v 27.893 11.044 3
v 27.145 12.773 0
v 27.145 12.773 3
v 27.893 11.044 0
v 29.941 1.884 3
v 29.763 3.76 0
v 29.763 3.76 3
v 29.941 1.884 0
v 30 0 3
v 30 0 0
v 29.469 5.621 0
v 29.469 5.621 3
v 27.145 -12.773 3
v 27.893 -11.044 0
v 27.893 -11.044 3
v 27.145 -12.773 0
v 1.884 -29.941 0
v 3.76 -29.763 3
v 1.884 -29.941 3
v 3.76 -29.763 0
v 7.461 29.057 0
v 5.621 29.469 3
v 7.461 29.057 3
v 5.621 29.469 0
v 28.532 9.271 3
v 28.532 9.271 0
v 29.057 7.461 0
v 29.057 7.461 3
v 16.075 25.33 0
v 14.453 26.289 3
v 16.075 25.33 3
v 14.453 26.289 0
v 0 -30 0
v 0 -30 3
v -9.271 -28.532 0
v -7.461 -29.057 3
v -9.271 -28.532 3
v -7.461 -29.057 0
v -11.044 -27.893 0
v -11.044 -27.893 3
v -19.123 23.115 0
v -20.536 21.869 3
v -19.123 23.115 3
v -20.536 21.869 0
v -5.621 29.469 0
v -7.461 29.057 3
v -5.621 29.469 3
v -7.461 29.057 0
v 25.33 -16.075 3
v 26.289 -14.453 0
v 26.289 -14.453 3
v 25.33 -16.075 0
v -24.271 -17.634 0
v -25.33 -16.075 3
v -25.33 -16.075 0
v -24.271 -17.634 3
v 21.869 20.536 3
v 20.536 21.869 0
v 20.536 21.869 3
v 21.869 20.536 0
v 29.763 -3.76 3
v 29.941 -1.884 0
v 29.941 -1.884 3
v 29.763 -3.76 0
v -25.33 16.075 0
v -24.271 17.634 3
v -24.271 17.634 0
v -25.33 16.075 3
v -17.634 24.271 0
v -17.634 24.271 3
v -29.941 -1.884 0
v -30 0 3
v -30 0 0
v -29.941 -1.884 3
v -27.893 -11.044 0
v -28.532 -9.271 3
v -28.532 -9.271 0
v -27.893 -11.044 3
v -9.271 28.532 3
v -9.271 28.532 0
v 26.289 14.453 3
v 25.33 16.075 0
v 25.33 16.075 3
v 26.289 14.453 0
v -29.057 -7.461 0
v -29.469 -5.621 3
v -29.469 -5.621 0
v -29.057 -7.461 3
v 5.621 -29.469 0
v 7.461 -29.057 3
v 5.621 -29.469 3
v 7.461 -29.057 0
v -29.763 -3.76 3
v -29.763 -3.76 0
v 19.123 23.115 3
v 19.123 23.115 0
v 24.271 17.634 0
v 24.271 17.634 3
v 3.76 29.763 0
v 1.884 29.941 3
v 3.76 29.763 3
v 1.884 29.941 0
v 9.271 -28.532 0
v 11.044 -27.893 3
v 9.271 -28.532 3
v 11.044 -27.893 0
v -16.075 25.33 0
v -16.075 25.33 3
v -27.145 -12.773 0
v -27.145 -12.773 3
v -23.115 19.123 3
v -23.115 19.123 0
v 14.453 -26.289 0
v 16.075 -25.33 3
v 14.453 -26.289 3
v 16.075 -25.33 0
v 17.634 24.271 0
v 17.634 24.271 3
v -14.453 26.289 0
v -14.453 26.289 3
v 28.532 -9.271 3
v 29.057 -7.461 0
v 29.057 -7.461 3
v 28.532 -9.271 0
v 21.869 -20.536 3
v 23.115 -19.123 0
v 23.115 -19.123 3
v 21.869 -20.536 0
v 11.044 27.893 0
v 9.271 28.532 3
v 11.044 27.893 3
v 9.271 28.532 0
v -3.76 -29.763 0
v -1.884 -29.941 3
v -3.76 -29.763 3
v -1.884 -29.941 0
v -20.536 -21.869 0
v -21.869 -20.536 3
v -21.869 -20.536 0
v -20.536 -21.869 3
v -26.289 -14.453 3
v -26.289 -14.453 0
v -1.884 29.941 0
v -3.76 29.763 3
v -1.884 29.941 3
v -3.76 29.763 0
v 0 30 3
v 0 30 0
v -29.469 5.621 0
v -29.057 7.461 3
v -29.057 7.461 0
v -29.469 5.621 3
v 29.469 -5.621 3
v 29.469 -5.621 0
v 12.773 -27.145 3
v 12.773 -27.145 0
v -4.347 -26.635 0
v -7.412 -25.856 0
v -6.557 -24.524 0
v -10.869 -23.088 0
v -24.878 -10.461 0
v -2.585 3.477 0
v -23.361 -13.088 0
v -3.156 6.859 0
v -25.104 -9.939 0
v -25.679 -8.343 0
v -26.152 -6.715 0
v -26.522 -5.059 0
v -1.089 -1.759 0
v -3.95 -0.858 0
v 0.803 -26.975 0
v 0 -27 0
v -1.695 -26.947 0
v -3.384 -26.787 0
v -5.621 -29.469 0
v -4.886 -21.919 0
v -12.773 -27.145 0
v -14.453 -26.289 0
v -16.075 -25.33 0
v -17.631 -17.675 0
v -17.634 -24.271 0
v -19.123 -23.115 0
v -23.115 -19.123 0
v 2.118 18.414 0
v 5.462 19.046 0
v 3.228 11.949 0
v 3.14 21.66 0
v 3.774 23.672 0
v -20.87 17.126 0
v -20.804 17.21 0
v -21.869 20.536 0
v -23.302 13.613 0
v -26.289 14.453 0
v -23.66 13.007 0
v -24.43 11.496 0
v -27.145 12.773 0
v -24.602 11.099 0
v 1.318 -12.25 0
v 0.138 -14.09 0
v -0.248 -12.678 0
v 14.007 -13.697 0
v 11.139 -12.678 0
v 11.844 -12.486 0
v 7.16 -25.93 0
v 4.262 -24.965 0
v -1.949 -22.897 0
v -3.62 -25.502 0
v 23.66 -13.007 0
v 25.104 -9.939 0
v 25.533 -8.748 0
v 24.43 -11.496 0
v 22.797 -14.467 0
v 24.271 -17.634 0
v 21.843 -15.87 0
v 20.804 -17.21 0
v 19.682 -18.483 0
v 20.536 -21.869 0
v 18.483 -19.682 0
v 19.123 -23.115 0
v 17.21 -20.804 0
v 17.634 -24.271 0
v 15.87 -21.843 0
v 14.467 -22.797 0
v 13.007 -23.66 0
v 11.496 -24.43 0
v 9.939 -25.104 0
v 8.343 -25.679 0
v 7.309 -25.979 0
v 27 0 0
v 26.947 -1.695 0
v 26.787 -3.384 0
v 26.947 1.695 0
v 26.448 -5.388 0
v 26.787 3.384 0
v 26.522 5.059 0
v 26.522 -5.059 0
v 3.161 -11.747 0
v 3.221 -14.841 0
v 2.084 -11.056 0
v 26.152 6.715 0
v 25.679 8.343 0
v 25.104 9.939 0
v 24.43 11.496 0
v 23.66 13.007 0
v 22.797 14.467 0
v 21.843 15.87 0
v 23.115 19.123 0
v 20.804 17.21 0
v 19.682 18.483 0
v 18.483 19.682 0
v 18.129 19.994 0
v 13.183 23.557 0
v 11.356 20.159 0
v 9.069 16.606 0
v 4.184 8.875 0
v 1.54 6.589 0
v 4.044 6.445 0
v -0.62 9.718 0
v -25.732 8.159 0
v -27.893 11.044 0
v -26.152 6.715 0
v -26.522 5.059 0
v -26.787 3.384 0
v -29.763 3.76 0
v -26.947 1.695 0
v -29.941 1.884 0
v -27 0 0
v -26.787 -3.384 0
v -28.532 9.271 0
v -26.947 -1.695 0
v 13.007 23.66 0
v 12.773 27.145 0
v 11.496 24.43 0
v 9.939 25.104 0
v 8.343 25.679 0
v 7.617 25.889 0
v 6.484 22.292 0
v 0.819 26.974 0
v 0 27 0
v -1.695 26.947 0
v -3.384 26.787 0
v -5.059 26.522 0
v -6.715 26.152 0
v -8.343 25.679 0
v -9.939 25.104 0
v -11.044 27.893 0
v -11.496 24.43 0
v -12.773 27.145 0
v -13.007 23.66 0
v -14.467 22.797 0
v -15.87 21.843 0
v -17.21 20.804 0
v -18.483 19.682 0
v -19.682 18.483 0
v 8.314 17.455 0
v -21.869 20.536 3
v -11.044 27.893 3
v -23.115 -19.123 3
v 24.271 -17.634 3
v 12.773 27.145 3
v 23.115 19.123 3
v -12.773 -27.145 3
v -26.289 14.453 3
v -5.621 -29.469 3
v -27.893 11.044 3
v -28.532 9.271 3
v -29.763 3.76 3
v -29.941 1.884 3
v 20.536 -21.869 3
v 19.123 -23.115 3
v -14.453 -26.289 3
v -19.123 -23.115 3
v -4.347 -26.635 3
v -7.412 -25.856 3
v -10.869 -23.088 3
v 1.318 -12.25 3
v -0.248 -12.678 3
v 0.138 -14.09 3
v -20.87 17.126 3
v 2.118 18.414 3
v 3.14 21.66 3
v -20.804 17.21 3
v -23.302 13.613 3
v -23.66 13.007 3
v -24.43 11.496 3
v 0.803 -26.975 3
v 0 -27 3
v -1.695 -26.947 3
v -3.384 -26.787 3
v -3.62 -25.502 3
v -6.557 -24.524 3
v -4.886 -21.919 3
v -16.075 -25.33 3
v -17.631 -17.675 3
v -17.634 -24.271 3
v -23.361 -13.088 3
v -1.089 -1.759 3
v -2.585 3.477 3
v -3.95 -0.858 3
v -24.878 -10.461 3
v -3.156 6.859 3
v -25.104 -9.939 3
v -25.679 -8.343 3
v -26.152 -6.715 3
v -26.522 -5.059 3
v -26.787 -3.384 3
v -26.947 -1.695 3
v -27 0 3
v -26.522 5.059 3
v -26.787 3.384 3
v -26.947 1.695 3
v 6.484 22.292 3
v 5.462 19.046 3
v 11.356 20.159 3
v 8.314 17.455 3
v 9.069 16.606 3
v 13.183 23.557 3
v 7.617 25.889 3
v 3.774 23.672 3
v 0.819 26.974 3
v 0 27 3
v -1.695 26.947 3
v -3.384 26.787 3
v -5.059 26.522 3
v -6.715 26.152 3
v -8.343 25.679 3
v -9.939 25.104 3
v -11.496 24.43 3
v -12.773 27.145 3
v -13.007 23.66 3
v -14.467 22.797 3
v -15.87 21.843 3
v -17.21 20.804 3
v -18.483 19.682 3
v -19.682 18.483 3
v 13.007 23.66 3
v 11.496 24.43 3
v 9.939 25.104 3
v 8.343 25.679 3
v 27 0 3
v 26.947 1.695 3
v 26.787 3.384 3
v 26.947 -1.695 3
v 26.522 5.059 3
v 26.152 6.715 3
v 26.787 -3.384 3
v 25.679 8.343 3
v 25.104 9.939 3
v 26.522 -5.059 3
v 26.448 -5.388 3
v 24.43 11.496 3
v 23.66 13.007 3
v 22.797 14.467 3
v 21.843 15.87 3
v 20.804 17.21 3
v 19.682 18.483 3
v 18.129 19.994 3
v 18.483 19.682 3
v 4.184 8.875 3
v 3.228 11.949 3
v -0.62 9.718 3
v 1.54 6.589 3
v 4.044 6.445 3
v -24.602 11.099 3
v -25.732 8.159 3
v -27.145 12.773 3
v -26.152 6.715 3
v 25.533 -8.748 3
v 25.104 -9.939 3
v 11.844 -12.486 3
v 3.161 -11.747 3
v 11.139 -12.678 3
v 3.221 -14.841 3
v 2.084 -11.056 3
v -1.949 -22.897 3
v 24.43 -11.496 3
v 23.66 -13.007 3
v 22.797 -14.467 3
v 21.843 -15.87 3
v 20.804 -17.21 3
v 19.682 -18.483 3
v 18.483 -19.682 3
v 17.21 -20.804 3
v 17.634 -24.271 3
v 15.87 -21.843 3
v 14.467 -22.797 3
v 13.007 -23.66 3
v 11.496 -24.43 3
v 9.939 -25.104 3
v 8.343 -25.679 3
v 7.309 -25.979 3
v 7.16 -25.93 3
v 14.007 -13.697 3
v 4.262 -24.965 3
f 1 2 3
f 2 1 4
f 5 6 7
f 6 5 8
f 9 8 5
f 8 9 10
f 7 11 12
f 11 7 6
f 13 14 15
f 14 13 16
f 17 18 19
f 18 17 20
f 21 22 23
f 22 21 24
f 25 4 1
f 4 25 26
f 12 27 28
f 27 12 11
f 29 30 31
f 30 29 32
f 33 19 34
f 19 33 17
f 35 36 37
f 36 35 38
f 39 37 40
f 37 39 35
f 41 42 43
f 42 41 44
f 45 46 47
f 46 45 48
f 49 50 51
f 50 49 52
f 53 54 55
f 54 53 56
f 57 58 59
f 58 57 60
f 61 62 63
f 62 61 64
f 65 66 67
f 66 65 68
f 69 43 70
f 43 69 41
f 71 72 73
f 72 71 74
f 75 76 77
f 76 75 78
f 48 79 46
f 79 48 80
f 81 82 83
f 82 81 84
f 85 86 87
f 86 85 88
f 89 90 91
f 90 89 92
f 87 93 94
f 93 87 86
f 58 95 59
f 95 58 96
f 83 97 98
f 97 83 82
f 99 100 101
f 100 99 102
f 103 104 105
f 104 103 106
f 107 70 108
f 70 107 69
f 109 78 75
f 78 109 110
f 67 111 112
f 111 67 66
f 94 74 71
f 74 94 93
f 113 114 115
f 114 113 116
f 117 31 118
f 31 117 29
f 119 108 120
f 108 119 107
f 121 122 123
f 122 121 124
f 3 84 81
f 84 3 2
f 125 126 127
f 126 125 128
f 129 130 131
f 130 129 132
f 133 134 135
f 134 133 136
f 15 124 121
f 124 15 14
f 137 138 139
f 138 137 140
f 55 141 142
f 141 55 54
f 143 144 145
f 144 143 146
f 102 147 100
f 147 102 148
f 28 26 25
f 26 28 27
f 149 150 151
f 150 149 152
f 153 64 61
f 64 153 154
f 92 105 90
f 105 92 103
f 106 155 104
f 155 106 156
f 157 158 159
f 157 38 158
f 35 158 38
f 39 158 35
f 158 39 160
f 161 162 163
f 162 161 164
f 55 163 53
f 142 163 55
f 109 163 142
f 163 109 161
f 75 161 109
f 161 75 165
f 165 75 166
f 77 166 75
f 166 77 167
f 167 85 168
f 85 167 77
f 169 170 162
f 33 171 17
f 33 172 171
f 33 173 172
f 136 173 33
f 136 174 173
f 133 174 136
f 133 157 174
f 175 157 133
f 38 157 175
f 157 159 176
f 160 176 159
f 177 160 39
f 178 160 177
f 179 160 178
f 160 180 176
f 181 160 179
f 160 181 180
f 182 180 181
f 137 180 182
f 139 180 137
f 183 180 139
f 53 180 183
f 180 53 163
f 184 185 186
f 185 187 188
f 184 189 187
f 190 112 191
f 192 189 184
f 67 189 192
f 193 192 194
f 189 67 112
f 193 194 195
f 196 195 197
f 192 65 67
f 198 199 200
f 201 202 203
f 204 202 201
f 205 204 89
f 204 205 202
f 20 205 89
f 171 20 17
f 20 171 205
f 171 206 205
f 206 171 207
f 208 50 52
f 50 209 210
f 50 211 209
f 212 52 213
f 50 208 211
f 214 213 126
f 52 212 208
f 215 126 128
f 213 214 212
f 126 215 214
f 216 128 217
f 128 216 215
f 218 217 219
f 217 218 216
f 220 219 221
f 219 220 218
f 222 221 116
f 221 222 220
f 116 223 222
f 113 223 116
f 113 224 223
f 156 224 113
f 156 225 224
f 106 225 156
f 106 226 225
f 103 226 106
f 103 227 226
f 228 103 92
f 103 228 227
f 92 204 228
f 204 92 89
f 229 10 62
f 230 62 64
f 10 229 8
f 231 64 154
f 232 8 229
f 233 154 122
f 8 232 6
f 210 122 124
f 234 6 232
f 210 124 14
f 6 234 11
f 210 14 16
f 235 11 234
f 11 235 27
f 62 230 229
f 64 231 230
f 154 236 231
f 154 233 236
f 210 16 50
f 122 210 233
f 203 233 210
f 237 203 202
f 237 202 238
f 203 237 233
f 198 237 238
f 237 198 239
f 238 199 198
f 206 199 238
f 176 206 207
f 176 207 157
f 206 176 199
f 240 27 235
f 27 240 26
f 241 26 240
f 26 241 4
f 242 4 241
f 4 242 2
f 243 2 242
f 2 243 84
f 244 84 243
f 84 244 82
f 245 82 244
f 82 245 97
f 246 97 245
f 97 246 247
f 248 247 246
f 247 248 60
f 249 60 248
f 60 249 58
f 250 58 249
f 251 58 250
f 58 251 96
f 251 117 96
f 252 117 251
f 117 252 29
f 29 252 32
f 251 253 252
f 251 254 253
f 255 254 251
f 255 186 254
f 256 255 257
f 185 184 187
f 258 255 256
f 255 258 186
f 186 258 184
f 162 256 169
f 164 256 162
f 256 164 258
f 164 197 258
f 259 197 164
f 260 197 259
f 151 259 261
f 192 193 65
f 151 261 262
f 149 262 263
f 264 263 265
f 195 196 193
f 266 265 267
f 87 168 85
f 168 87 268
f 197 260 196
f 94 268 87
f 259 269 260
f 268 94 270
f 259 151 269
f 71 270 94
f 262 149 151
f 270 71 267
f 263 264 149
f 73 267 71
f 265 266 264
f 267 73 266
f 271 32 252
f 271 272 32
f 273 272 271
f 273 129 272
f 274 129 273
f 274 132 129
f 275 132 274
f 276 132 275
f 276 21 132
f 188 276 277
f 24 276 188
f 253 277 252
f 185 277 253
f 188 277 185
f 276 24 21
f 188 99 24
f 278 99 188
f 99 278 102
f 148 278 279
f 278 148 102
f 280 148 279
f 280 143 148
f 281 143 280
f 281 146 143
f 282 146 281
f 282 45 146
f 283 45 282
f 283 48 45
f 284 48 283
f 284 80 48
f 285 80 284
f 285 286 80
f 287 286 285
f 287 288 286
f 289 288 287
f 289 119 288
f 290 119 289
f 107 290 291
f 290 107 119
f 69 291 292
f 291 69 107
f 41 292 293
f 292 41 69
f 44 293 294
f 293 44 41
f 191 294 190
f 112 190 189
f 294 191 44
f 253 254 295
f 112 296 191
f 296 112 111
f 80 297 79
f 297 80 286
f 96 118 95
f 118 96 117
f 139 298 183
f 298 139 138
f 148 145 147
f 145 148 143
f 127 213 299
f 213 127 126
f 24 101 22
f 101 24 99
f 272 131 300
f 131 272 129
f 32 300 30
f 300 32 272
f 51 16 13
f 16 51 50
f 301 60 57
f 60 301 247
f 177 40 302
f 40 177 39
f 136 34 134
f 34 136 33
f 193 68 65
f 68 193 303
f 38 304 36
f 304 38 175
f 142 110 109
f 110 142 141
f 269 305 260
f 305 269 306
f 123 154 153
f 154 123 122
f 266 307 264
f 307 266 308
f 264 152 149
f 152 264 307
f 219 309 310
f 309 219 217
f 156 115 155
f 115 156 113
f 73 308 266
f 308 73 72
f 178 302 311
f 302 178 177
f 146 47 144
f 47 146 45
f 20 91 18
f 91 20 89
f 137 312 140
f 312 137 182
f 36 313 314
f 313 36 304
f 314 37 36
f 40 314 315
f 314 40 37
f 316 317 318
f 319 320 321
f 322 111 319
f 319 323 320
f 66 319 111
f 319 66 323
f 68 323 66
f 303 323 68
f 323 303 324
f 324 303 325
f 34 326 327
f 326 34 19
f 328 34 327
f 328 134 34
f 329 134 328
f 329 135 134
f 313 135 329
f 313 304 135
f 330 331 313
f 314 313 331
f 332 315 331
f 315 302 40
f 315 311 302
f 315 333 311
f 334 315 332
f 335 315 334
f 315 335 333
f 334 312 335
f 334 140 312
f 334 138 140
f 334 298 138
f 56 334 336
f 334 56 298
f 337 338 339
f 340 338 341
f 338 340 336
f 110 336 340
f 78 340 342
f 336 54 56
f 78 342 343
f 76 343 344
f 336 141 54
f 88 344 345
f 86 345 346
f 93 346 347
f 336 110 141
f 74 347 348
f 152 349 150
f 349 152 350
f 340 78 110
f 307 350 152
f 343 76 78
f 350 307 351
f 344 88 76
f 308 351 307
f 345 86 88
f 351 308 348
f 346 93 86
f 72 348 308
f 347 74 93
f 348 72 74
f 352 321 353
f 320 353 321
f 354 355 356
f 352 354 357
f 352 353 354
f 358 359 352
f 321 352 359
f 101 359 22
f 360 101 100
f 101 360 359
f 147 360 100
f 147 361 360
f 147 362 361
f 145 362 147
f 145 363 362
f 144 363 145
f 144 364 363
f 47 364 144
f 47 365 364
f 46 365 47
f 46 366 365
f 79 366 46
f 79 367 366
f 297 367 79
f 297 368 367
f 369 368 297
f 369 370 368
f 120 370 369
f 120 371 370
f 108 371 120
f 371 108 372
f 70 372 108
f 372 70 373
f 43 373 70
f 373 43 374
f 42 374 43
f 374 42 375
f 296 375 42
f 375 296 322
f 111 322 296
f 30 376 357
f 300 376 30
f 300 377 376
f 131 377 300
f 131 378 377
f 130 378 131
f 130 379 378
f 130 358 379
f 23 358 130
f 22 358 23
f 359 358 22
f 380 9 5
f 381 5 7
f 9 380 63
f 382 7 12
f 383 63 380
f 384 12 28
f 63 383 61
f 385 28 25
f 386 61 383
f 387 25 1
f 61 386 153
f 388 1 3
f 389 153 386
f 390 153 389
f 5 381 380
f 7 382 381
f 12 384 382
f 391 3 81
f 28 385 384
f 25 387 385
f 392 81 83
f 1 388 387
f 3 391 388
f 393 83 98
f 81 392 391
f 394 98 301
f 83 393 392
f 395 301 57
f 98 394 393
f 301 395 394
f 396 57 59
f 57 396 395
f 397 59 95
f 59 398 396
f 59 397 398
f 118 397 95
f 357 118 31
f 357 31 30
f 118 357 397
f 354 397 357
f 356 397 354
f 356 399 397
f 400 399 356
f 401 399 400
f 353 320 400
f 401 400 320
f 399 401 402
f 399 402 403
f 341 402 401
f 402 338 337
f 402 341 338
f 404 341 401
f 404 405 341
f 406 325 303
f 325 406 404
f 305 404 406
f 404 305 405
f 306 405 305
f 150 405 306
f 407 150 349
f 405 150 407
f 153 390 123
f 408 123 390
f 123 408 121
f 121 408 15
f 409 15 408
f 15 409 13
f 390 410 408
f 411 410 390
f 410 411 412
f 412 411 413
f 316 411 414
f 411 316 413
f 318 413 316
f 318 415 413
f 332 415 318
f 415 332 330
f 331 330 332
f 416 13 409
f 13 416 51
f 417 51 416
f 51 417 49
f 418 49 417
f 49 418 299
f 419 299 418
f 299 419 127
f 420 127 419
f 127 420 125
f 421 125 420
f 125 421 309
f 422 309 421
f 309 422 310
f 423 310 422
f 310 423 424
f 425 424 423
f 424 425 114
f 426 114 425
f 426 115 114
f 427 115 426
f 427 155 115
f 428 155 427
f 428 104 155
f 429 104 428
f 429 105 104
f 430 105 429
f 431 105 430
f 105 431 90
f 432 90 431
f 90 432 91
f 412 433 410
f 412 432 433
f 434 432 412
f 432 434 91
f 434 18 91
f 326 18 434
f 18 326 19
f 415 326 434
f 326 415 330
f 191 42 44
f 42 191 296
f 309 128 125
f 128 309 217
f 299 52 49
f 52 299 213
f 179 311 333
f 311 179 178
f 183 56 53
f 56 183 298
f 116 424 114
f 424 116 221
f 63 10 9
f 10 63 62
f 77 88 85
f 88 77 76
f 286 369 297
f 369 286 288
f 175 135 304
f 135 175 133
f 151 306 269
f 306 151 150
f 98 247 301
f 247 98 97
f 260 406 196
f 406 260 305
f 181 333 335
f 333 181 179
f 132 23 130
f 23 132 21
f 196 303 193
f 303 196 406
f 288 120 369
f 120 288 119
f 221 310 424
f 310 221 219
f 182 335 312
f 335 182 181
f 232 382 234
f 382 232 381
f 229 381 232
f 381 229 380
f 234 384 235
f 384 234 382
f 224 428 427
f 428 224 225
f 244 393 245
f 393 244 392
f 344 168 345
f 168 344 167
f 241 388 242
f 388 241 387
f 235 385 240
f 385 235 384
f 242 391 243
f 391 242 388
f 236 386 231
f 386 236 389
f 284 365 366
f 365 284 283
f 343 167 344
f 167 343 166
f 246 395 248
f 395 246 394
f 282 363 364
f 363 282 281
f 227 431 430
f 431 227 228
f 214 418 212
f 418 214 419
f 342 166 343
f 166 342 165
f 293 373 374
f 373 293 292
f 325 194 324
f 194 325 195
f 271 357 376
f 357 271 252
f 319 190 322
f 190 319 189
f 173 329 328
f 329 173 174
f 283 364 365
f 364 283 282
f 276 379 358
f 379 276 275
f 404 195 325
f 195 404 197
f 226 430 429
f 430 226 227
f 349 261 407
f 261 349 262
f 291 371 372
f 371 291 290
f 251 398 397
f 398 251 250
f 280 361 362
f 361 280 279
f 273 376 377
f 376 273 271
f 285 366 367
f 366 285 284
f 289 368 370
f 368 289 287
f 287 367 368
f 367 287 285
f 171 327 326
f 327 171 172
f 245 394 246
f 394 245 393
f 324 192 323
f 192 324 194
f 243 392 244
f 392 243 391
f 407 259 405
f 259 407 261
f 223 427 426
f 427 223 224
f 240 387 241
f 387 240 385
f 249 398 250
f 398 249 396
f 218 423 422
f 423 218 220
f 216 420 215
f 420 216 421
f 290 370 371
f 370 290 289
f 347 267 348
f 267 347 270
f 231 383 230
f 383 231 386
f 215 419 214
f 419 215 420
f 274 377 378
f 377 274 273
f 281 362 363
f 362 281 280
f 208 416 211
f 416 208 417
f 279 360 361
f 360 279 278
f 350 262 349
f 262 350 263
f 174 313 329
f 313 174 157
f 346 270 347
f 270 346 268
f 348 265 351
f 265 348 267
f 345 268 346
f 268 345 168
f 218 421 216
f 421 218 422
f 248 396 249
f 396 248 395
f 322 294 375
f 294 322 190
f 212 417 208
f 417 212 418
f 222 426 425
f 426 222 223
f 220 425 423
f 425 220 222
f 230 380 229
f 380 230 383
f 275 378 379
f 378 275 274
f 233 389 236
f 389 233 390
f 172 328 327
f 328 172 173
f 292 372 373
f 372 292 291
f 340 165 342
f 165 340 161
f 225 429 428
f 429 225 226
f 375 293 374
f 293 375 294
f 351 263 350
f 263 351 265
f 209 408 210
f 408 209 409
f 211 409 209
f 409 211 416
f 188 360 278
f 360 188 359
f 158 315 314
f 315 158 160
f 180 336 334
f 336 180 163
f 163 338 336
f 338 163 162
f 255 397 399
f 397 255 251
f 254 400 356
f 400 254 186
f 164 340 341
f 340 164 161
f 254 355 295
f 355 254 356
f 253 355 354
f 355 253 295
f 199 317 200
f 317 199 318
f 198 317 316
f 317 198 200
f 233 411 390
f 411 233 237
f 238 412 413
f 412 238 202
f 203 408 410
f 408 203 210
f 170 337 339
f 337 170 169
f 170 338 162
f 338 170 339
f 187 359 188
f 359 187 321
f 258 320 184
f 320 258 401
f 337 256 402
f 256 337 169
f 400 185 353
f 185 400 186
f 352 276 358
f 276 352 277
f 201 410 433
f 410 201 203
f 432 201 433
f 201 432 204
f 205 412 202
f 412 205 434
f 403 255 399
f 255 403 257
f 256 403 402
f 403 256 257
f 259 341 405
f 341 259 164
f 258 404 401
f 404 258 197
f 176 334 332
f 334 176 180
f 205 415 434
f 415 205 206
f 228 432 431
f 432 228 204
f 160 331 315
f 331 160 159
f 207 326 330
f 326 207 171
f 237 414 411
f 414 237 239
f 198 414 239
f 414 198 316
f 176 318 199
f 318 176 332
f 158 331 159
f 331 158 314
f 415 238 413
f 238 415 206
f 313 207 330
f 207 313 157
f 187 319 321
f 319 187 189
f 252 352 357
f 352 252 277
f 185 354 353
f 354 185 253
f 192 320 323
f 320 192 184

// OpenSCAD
// file: common.scad
DEFAULT_FN = 100;
DEFAULT_COASTER_RADIUS = 30;
DEFAULT_THICKNESS = 3;
// main file
include <common.scad>;

DEFAULT_NUM_LINES = 30;

module RandoLineCoasterRound(
    numLines = DEFAULT_NUM_LINES,
    radius = DEFAULT_COASTER_RADIUS,
    thickness = DEFAULT_THICKNESS,
    fn = DEFAULT_FN)
{
    difference()
    {
        cylinder(r = radius, h = thickness, $fn = fn);
        translate([0, 0, -1])
        cylinder(r = radius - thickness, h = thickness + 2, $fn = fn);
    }

    intersection()
    {
        cylinder(r = radius, h = thickness, $fn = fn);
        for (i = [0 : numLines - 1])
        {
            x = rands(radius * -2, radius * 2, 1)[0];
            y = rands(radius * -2, radius * 2, 1)[0];
            r = rands(0, 360, 1)[0];
            translate([x, y, 0])
            rotate([0, 0, r])
            cube([radius * 10, thickness, thickness]);
        }
    }
}

RandoLineCoasterRound();
